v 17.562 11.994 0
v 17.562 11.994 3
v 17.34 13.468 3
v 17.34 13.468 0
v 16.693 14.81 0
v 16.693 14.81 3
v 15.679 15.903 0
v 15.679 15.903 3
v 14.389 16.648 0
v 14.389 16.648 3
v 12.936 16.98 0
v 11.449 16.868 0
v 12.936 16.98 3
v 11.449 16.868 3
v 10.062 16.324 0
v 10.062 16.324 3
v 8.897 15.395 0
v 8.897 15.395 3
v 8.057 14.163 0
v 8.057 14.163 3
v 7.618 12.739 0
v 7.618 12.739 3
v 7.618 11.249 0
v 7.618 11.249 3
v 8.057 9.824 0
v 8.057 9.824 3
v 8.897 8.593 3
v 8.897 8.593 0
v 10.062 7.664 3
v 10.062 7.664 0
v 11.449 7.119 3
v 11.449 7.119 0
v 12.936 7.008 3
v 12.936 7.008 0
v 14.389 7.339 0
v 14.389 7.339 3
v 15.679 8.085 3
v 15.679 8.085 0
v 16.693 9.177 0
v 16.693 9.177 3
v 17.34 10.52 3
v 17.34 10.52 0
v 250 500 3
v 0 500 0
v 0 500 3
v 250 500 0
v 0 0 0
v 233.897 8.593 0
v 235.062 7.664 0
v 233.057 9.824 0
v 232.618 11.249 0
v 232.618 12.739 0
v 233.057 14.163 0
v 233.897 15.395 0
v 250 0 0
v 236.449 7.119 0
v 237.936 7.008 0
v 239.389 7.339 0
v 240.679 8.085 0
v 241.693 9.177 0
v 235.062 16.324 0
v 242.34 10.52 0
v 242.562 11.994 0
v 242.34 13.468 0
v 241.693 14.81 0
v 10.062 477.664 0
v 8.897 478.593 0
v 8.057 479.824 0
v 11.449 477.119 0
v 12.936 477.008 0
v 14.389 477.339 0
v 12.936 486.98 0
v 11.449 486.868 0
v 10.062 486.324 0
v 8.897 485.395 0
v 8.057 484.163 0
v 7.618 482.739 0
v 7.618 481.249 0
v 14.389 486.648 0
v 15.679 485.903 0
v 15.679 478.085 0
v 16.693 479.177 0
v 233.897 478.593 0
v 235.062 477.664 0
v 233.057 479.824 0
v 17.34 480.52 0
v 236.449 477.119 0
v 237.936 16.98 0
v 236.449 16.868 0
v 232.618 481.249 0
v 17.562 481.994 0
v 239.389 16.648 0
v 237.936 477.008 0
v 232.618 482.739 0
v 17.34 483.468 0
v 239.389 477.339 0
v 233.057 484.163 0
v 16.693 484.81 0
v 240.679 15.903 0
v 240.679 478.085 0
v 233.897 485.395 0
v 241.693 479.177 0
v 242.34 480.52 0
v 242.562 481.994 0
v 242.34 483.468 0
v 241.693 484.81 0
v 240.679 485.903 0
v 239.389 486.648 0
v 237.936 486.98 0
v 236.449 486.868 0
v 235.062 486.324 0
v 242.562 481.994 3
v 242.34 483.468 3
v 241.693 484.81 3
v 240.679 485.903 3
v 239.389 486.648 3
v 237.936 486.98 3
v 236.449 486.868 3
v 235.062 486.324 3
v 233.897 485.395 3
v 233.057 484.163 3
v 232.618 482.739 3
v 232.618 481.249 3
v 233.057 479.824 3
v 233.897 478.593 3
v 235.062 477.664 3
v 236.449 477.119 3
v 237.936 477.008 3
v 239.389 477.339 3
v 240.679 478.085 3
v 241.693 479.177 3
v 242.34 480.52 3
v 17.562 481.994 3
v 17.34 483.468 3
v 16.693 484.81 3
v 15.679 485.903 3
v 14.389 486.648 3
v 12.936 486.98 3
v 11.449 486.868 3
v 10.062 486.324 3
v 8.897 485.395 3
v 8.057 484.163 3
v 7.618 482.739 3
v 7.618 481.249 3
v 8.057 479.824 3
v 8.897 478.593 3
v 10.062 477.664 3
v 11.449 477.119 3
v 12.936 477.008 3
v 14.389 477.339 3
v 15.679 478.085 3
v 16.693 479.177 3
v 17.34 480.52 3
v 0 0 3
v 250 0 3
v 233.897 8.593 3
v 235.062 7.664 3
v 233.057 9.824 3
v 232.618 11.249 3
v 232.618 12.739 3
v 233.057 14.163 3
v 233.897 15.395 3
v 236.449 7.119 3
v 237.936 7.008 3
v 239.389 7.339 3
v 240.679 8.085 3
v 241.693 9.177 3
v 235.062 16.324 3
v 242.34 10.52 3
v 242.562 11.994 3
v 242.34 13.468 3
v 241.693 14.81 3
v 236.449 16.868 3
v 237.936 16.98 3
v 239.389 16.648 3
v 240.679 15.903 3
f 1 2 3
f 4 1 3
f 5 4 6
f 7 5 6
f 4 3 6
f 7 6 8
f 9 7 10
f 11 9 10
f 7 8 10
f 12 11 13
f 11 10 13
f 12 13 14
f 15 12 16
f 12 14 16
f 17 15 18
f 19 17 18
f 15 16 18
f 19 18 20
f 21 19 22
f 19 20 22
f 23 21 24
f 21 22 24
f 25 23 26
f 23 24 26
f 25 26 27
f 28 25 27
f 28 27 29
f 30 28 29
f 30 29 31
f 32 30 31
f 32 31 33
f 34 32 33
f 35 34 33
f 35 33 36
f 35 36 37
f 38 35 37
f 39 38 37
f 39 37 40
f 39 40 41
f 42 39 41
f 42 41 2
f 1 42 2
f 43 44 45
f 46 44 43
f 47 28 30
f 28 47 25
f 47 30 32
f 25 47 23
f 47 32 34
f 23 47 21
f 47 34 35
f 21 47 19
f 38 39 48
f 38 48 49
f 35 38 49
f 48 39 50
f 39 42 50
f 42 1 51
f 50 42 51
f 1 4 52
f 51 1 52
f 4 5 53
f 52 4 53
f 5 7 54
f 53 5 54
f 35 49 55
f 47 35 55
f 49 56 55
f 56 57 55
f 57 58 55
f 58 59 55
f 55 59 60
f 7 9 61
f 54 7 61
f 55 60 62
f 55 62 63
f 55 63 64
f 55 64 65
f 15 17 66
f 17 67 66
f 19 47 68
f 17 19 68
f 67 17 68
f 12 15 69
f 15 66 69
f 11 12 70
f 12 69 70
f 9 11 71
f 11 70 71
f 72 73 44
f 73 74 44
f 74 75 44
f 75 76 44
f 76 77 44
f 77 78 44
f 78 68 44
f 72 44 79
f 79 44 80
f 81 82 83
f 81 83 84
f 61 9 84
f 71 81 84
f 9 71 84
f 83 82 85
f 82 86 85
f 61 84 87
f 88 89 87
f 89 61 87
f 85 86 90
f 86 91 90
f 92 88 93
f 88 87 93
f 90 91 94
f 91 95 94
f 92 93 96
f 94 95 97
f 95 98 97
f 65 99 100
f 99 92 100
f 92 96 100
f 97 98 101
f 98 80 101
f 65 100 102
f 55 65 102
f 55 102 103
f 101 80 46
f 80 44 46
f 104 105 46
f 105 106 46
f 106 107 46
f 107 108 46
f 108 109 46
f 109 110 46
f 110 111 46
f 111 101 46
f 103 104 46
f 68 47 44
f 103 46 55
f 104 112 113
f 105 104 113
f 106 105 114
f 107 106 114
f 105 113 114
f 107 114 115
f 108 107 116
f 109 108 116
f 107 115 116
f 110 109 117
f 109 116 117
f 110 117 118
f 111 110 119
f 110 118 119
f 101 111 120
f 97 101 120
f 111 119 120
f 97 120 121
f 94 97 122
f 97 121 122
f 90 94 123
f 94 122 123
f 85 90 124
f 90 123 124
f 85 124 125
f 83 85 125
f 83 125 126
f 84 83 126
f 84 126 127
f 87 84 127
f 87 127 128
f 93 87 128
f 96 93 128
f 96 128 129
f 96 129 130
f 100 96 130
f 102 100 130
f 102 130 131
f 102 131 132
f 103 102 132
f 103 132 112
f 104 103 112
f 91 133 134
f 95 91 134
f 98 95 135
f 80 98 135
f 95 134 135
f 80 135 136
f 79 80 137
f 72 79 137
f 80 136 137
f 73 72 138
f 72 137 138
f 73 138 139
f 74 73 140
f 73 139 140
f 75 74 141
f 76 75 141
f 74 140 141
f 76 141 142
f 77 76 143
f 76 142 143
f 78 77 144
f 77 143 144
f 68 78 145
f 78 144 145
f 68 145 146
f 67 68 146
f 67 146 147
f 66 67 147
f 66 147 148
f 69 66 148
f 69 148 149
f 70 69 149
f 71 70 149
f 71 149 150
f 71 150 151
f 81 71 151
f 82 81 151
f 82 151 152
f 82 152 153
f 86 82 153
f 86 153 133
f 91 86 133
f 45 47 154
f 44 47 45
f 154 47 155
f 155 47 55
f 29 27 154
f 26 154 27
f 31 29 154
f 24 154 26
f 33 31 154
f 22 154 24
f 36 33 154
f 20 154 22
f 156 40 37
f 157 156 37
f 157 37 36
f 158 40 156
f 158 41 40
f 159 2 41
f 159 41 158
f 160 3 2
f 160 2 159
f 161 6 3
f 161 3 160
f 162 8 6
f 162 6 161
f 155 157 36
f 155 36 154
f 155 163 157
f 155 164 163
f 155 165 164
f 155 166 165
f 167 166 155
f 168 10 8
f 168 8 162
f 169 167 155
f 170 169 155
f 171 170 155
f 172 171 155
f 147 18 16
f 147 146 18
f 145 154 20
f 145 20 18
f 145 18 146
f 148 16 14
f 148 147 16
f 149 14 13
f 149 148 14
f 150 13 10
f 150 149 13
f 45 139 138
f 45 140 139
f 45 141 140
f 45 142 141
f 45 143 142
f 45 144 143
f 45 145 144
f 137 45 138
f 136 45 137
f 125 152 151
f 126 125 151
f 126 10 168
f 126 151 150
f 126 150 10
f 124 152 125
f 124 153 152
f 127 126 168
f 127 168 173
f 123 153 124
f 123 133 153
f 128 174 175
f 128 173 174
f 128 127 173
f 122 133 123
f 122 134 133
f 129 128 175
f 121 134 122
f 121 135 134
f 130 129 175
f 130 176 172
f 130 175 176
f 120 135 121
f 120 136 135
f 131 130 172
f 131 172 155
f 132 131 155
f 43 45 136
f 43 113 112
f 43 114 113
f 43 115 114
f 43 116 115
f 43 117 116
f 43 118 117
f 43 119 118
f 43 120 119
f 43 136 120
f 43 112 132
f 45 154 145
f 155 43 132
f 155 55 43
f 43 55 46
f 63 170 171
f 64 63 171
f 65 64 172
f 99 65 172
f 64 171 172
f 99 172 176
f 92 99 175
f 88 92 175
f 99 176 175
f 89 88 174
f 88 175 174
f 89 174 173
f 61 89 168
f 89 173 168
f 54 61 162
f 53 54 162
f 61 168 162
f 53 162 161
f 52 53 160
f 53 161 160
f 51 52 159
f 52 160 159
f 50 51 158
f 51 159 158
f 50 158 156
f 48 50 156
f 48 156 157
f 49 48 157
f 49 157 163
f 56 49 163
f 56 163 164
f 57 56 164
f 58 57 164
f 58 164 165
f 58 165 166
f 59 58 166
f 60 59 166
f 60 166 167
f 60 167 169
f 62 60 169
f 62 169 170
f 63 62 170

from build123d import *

# Parameters (mm, degrees)
ESQUISSE1_W                          = 250
ESQUISSE1_H                          = 500
BOSS_EXTRU_1_DEPTH                   = 3
ENL_V_MAT_EXTRU_1_REACH              = 561.025
ESQUISSE2_R                          = 5
R_P_TITION_LIN_AIRE1_COUNT           = 2
R_P_TITION_LIN_AIRE1_PITCH           = 225
R_P_TITION_LIN_AIRE2_COUNT           = 2
R_P_TITION_LIN_AIRE2_PITCH           = 470
R_P_TITION_LIN_AIRE2_COPY_1_REACH    = 561.025
R_P_TITION_LIN_AIRE2_COPY_1_SKETCH_R = 5


with BuildPart() as part:
    # Esquisse1 → Boss.-Extru.1 (new body)
    with BuildSketch(Plane.XY):
        with Locations((125, 250)):
            Rectangle(ESQUISSE1_W, ESQUISSE1_H)
    extrude(amount=BOSS_EXTRU_1_DEPTH)

    # Esquisse2 → Enlèv. mat.-Extru.1 (cut, up to next)
    with BuildSketch(Plane.XY.offset(3), mode=Mode.PRIVATE) as enl_v_mat_extru_1_sk1:
        with Locations((12.561884872, 11.993805772)):
            Circle(ESQUISSE2_R)
    enl_v_mat_extru_1_tool1 = extrude(enl_v_mat_extru_1_sk1.sketch, amount=-ENL_V_MAT_EXTRU_1_REACH, mode=Mode.PRIVATE) & part.part
    enl_v_mat_extru_1 = enl_v_mat_extru_1_tool1.solids().sort_by_distance((12.561885, 11.993806, 3))[0]
    add(enl_v_mat_extru_1, mode=Mode.SUBTRACT)

    # Répétition linéaire1: Enlèv. mat.-Extru.1 ×2
    with Locations(*[(i * R_P_TITION_LIN_AIRE1_PITCH, 0, 0) for i in range(1, R_P_TITION_LIN_AIRE1_COUNT)]):
        add(enl_v_mat_extru_1, mode=Mode.SUBTRACT)

    # Répétition linéaire2: Enlèv. mat.-Extru.1 ×2
    with Locations(*[(0, i * R_P_TITION_LIN_AIRE2_PITCH, 0) for i in range(1, R_P_TITION_LIN_AIRE2_COUNT)]):
        add(enl_v_mat_extru_1, mode=Mode.SUBTRACT)

    # Répétition linéaire2 copy 1 sketch → Répétition linéaire2 copy 1 (cut, up to next)
    with BuildSketch(Plane(origin=(225, 470, 3), x_dir=(1, 0, 0), z_dir=(0, 0, 1)), mode=Mode.PRIVATE) as r_p_tition_lin_aire2_copy_1_sk1:
        with Locations((12.561884872, 11.993805772)):
            Circle(R_P_TITION_LIN_AIRE2_COPY_1_SKETCH_R)
    r_p_tition_lin_aire2_copy_1_tool1 = extrude(r_p_tition_lin_aire2_copy_1_sk1.sketch, amount=-R_P_TITION_LIN_AIRE2_COPY_1_REACH, mode=Mode.PRIVATE) & part.part
    add(r_p_tition_lin_aire2_copy_1_tool1.solids().sort_by_distance((237.561885, 481.993806, 3))[0], mode=Mode.SUBTRACT)


solid = part.part
